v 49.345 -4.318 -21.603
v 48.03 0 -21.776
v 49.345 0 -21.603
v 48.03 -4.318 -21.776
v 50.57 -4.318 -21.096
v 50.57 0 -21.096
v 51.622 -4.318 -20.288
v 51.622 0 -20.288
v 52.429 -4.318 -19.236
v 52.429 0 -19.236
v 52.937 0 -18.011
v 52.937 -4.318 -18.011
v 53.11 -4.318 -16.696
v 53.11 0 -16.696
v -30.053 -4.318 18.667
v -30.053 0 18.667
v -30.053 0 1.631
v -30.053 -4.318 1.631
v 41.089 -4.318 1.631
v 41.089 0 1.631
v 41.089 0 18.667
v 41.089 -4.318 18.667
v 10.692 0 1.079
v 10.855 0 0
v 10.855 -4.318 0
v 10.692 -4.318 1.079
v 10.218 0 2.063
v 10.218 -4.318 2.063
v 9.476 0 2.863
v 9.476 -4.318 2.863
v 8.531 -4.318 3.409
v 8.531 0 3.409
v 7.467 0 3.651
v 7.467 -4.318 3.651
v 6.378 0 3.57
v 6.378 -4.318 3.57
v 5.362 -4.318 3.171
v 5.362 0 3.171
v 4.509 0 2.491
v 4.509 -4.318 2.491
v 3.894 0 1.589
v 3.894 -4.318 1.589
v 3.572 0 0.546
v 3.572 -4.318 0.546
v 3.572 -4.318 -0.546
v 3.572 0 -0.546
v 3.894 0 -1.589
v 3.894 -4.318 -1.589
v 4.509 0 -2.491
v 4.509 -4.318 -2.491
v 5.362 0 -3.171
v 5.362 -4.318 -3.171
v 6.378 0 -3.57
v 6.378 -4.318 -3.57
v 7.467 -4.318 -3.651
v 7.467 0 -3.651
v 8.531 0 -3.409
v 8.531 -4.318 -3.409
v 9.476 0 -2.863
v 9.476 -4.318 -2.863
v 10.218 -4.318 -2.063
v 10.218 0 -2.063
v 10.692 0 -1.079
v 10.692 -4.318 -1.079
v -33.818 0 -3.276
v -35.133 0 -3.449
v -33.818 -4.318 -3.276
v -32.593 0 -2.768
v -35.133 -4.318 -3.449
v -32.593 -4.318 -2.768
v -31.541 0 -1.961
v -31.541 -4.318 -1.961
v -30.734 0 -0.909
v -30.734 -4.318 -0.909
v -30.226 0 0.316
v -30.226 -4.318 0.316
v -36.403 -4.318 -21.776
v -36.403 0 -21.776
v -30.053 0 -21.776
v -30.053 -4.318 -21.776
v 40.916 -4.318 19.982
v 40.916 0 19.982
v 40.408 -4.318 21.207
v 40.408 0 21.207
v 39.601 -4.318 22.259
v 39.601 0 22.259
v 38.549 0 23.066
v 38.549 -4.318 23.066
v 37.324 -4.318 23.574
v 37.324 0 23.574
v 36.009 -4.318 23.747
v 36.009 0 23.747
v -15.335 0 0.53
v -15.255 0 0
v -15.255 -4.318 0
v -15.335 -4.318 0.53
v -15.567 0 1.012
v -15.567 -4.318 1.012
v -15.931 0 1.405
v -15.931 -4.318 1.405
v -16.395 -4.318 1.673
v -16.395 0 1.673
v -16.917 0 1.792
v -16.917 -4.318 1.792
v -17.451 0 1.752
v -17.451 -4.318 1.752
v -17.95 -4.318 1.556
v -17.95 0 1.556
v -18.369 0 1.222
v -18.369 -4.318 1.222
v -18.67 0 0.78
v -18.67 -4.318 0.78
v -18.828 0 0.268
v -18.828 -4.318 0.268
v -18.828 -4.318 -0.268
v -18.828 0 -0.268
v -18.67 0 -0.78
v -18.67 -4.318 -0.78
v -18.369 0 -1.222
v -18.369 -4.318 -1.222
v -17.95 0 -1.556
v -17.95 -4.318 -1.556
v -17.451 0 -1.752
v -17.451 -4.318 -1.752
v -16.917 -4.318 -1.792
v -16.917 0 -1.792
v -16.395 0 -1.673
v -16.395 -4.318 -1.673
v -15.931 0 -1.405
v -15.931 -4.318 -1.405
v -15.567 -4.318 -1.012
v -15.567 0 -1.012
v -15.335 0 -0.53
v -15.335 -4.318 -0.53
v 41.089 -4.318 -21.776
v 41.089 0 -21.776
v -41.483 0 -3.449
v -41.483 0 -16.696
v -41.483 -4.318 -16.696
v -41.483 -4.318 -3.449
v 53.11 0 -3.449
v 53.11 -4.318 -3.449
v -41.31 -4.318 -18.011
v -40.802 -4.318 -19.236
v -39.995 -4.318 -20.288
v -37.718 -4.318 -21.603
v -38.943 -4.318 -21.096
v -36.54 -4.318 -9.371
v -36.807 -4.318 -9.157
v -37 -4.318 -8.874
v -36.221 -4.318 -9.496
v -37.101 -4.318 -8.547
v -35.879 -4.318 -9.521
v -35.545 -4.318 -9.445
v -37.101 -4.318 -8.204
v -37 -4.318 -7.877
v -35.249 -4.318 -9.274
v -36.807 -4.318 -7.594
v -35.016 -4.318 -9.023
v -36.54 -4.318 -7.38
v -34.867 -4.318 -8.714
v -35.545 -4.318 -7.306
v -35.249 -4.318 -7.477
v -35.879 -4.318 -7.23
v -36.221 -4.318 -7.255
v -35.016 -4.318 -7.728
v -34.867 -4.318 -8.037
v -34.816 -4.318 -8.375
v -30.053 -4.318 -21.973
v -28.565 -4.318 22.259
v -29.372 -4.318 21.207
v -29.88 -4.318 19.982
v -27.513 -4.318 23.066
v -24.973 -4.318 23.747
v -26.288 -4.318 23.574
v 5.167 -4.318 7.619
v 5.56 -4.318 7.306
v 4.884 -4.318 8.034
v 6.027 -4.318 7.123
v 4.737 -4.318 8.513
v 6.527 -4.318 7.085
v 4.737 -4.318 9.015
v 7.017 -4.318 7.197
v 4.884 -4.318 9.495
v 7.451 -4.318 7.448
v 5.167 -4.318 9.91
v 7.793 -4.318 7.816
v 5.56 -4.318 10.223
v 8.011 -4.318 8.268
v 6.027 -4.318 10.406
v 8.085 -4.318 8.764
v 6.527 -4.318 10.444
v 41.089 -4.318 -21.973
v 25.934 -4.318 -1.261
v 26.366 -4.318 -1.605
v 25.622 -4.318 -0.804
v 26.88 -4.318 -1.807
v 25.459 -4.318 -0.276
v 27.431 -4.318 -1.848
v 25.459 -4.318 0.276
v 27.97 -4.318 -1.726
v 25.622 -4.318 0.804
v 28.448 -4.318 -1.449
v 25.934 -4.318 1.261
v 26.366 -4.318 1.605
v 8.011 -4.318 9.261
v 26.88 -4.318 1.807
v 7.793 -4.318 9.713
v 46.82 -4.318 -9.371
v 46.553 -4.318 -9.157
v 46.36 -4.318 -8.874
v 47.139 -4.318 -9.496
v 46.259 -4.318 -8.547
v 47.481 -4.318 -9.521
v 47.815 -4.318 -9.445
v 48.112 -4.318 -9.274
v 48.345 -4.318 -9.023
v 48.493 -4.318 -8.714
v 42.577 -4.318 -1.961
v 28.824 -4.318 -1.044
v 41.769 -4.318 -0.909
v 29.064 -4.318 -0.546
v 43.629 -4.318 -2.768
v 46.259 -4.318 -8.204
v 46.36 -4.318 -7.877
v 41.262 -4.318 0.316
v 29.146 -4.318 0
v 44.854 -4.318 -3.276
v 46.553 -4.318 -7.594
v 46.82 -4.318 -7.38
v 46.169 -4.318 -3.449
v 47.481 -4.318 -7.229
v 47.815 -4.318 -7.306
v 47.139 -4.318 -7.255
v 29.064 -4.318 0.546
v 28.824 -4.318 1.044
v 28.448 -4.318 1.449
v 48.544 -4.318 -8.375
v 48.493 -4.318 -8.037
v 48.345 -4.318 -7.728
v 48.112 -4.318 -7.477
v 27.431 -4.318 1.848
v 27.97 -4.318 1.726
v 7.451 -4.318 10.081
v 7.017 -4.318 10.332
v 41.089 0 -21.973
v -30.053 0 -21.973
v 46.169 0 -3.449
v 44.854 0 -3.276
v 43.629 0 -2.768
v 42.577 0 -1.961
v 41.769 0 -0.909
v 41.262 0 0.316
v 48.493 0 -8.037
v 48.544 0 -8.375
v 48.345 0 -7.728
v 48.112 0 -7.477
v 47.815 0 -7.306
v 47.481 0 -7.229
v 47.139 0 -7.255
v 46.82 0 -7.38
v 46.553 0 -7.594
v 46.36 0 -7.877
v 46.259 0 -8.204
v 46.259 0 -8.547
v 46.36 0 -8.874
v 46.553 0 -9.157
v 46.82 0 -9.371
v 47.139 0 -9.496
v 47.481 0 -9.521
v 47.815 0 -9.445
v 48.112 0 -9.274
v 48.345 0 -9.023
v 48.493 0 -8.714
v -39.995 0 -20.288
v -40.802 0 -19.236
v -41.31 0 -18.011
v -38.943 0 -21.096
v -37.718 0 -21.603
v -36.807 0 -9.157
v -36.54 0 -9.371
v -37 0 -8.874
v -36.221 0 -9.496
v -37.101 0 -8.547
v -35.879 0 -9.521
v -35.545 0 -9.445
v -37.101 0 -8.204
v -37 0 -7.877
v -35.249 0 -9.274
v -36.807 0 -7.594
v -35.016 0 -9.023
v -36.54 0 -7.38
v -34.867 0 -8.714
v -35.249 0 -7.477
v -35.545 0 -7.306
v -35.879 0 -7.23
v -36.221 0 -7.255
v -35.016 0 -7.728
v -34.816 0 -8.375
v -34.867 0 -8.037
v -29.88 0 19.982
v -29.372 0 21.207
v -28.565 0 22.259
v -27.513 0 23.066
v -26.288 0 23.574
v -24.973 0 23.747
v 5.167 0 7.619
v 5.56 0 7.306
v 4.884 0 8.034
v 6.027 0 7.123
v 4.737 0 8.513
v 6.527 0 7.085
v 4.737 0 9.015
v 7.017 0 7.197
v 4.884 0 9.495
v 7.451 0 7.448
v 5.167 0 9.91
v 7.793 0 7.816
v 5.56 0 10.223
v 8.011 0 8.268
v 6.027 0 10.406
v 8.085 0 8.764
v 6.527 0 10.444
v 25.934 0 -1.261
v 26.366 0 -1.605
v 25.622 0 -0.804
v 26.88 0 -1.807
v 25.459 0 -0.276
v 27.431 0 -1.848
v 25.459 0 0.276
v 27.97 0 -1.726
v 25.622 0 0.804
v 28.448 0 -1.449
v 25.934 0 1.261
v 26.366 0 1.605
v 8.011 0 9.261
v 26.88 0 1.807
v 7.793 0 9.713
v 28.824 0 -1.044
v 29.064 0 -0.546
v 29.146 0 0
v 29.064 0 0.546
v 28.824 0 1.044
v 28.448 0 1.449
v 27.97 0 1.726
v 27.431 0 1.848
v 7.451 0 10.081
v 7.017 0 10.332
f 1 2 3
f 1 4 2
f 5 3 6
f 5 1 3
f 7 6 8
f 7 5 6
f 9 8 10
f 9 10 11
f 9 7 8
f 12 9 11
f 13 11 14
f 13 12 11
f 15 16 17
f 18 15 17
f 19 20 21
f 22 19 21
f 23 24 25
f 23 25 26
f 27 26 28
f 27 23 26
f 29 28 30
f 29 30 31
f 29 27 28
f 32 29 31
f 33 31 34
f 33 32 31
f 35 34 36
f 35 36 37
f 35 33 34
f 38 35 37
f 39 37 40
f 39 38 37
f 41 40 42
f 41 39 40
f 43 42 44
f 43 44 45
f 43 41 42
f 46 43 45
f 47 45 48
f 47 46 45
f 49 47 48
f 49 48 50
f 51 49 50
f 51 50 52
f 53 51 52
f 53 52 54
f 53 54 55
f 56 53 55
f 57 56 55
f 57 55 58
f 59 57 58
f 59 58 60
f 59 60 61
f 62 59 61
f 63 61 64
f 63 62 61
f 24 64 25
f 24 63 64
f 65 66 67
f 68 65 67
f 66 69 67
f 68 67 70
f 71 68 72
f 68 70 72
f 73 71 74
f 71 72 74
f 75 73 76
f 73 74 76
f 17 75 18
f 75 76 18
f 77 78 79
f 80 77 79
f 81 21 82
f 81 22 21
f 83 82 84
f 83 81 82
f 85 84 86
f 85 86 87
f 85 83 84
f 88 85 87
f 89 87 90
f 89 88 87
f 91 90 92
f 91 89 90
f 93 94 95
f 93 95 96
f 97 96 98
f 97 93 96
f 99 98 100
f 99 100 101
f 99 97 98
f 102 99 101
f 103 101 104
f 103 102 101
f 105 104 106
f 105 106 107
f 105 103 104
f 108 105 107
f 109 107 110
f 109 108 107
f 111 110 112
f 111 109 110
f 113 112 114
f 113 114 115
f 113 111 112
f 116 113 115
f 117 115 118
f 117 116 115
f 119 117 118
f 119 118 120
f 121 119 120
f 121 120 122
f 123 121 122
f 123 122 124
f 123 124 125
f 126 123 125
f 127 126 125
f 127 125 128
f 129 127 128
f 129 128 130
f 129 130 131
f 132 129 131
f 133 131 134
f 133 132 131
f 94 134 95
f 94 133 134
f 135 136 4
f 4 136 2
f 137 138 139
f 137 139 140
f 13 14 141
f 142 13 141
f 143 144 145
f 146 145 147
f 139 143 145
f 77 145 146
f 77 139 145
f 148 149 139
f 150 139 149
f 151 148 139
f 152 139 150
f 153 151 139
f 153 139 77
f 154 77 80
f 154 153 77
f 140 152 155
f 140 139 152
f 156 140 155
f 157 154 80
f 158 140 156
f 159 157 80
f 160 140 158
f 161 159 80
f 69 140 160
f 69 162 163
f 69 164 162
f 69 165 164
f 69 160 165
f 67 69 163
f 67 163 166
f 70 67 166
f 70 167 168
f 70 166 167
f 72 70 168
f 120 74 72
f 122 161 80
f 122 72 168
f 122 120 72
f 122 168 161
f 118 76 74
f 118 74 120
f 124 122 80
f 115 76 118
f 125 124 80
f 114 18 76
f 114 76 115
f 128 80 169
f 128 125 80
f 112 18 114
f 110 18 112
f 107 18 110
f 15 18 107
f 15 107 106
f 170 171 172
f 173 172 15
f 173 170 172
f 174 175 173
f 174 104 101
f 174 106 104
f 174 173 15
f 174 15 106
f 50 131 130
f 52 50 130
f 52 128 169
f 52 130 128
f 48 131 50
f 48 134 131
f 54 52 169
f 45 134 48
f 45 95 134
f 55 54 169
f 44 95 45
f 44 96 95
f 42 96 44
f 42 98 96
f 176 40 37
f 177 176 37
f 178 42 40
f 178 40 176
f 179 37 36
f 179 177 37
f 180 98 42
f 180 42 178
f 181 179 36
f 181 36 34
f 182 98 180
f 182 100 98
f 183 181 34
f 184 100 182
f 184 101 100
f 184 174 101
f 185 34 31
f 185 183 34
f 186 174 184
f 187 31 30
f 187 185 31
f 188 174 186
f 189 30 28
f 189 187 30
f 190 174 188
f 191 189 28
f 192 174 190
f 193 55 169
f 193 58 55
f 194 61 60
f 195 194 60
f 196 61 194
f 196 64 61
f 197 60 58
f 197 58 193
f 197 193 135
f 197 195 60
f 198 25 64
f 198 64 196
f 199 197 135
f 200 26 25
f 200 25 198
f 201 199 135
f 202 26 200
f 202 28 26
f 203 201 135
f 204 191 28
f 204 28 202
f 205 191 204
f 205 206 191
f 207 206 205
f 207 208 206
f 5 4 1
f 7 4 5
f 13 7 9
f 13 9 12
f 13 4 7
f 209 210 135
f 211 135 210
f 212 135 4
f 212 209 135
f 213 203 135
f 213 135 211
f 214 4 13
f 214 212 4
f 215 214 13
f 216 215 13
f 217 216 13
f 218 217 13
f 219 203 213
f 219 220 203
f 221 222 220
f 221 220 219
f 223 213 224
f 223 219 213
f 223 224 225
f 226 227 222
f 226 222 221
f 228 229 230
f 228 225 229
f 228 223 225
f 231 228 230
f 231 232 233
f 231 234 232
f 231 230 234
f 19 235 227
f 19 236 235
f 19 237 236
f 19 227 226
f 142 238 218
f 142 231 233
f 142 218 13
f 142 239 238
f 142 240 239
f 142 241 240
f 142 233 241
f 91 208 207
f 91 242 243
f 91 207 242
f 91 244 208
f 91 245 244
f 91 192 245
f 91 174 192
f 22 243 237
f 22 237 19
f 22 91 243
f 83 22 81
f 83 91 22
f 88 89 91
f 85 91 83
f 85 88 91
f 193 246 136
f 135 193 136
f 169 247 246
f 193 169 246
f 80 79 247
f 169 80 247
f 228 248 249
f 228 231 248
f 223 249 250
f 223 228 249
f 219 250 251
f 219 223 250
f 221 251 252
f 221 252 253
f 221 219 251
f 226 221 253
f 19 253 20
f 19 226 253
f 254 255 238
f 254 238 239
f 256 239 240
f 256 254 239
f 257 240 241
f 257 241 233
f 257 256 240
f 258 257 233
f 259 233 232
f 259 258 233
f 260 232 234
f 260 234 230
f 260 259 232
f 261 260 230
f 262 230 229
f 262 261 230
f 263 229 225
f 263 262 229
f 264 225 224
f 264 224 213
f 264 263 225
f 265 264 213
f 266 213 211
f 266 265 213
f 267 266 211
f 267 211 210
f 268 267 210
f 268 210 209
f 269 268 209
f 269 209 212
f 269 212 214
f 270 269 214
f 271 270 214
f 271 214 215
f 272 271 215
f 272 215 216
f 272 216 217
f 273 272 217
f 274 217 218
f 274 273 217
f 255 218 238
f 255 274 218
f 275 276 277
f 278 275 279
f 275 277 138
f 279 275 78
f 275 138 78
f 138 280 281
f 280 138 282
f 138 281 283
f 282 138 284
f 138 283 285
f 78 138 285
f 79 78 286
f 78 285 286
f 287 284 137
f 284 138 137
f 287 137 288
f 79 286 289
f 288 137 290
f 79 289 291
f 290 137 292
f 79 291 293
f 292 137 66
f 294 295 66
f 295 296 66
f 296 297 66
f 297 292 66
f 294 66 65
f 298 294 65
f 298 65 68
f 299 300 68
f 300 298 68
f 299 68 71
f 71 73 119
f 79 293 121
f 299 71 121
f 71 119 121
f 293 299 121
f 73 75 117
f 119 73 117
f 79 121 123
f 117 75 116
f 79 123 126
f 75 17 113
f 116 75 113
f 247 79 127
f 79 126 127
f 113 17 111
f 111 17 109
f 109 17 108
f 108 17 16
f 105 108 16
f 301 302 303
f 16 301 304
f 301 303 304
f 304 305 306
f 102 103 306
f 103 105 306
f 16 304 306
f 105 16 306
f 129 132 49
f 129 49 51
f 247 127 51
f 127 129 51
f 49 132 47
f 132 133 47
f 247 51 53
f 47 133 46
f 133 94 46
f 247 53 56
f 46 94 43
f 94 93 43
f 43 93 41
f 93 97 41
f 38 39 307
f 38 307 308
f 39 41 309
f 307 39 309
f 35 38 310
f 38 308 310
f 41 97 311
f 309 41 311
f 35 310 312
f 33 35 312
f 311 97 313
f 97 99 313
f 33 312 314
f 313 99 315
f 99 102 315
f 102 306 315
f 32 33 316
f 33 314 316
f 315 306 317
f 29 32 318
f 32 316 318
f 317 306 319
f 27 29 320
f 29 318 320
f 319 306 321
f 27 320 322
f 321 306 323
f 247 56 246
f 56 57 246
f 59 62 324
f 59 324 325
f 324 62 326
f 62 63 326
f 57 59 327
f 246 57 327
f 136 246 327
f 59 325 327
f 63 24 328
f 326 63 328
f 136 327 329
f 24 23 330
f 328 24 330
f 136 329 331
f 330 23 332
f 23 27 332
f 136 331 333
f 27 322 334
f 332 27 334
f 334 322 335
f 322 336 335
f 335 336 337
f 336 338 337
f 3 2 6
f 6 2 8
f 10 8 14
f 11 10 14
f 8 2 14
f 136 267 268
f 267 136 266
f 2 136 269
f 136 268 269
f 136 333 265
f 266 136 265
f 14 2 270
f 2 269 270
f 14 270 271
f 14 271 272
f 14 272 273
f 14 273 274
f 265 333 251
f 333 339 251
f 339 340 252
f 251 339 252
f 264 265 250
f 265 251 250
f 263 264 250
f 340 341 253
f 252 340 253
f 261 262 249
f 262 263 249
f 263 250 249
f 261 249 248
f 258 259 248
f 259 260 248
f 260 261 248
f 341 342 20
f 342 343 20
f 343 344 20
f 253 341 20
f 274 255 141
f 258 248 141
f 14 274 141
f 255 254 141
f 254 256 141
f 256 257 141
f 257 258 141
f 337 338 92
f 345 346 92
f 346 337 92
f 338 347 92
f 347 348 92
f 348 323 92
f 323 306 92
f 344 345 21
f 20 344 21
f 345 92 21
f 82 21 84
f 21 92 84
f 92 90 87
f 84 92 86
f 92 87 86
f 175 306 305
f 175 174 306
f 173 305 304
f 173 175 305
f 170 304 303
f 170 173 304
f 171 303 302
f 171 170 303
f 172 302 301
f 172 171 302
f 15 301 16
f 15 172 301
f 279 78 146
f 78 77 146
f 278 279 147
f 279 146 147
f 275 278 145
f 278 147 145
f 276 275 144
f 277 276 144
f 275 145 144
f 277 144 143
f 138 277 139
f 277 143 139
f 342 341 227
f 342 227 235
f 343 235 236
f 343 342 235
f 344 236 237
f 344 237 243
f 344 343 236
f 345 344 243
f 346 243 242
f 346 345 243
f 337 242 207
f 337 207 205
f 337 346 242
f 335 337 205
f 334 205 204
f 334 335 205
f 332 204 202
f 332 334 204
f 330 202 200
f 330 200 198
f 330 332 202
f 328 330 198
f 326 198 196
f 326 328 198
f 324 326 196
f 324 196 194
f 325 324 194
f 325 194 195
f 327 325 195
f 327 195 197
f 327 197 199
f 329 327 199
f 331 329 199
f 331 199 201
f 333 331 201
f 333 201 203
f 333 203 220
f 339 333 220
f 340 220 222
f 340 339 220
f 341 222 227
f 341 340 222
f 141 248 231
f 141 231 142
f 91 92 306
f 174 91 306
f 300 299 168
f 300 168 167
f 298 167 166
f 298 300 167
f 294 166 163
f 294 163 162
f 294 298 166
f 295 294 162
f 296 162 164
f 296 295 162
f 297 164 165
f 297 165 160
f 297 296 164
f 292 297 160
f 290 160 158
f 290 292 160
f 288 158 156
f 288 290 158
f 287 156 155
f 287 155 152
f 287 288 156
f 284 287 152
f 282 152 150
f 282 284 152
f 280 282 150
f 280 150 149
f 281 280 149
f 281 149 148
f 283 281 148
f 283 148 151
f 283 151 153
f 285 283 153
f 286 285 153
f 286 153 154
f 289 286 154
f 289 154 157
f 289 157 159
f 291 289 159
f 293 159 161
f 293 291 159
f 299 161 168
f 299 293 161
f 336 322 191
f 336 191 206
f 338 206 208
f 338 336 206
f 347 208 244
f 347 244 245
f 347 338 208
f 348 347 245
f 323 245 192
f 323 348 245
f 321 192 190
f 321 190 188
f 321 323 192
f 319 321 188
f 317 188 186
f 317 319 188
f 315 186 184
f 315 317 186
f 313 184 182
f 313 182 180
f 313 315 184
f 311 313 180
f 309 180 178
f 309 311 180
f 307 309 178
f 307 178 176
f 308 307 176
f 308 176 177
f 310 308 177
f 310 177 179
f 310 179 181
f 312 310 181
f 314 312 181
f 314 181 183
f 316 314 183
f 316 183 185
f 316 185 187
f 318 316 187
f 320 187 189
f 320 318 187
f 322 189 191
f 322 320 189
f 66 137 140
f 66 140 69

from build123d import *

# Parameters (mm, degrees)
F0_R     = 1.796742
F0_R_2   = 3.661721
F0_R_3   = 1.853658
F0_R_4   = 1.683803
F0_W     = 11.430001
F0_H     = 18.327412
F0_R_5   = 1.149098
F0_W_2   = 12.02121
F0_R_6   = 1.149206
F1_DEPTH = 4.318
F2_R     = 5.08


with BuildPart() as f1:
    # F0 (on Front) → F1 (new body)
    with BuildSketch(Plane.XZ):
        Polygon((41.088879, 23.746809), (-30.053018, 23.746809), (-30.053018, -3.448707), (-30.053018, -21.776119), (-30.053018, -21.973191), (41.088879, -21.973191), (41.088879, -21.776119), (41.088879, -3.448707), align=None)
        with Locations((-17.051516, 0)):
            Circle(F0_R, mode=Mode.SUBTRACT)
        with Locations((7.193016, 0)):
            Circle(F0_R_2, mode=Mode.SUBTRACT)
        with Locations((27.29243, 0)):
            Circle(F0_R_3, mode=Mode.SUBTRACT)
        with Locations((6.401504, 8.764441)):
            Circle(F0_R_4, mode=Mode.SUBTRACT)
        with Locations((-35.768018, -12.612413)):
            Rectangle(F0_W, F0_H)
        with Locations((-35.965085, -8.375431)):
            Circle(F0_R_5, mode=Mode.SUBTRACT)
        with Locations((47.099484, -12.612413)):
            Rectangle(F0_W_2, F0_H)
        with Locations((47.395017, -8.375431)):
            Circle(F0_R_6, mode=Mode.SUBTRACT)
    extrude(amount=F1_DEPTH)

    # F2
    f2_edges = [f1.edges().sort_by_distance(p)[0] for p in [
        (-30.053018, -2.159, 23.746809),
        (41.088879, -2.159, 23.746809),
        (-30.053018, -2.159, -3.448707),
        (41.088879, -2.159, -3.448707),
        (53.110089, -2.159, -21.776119),
        (-41.483019, -2.159, -21.776119),
    ]]
    fillet(f2_edges, radius=F2_R)


solid = f1.part
